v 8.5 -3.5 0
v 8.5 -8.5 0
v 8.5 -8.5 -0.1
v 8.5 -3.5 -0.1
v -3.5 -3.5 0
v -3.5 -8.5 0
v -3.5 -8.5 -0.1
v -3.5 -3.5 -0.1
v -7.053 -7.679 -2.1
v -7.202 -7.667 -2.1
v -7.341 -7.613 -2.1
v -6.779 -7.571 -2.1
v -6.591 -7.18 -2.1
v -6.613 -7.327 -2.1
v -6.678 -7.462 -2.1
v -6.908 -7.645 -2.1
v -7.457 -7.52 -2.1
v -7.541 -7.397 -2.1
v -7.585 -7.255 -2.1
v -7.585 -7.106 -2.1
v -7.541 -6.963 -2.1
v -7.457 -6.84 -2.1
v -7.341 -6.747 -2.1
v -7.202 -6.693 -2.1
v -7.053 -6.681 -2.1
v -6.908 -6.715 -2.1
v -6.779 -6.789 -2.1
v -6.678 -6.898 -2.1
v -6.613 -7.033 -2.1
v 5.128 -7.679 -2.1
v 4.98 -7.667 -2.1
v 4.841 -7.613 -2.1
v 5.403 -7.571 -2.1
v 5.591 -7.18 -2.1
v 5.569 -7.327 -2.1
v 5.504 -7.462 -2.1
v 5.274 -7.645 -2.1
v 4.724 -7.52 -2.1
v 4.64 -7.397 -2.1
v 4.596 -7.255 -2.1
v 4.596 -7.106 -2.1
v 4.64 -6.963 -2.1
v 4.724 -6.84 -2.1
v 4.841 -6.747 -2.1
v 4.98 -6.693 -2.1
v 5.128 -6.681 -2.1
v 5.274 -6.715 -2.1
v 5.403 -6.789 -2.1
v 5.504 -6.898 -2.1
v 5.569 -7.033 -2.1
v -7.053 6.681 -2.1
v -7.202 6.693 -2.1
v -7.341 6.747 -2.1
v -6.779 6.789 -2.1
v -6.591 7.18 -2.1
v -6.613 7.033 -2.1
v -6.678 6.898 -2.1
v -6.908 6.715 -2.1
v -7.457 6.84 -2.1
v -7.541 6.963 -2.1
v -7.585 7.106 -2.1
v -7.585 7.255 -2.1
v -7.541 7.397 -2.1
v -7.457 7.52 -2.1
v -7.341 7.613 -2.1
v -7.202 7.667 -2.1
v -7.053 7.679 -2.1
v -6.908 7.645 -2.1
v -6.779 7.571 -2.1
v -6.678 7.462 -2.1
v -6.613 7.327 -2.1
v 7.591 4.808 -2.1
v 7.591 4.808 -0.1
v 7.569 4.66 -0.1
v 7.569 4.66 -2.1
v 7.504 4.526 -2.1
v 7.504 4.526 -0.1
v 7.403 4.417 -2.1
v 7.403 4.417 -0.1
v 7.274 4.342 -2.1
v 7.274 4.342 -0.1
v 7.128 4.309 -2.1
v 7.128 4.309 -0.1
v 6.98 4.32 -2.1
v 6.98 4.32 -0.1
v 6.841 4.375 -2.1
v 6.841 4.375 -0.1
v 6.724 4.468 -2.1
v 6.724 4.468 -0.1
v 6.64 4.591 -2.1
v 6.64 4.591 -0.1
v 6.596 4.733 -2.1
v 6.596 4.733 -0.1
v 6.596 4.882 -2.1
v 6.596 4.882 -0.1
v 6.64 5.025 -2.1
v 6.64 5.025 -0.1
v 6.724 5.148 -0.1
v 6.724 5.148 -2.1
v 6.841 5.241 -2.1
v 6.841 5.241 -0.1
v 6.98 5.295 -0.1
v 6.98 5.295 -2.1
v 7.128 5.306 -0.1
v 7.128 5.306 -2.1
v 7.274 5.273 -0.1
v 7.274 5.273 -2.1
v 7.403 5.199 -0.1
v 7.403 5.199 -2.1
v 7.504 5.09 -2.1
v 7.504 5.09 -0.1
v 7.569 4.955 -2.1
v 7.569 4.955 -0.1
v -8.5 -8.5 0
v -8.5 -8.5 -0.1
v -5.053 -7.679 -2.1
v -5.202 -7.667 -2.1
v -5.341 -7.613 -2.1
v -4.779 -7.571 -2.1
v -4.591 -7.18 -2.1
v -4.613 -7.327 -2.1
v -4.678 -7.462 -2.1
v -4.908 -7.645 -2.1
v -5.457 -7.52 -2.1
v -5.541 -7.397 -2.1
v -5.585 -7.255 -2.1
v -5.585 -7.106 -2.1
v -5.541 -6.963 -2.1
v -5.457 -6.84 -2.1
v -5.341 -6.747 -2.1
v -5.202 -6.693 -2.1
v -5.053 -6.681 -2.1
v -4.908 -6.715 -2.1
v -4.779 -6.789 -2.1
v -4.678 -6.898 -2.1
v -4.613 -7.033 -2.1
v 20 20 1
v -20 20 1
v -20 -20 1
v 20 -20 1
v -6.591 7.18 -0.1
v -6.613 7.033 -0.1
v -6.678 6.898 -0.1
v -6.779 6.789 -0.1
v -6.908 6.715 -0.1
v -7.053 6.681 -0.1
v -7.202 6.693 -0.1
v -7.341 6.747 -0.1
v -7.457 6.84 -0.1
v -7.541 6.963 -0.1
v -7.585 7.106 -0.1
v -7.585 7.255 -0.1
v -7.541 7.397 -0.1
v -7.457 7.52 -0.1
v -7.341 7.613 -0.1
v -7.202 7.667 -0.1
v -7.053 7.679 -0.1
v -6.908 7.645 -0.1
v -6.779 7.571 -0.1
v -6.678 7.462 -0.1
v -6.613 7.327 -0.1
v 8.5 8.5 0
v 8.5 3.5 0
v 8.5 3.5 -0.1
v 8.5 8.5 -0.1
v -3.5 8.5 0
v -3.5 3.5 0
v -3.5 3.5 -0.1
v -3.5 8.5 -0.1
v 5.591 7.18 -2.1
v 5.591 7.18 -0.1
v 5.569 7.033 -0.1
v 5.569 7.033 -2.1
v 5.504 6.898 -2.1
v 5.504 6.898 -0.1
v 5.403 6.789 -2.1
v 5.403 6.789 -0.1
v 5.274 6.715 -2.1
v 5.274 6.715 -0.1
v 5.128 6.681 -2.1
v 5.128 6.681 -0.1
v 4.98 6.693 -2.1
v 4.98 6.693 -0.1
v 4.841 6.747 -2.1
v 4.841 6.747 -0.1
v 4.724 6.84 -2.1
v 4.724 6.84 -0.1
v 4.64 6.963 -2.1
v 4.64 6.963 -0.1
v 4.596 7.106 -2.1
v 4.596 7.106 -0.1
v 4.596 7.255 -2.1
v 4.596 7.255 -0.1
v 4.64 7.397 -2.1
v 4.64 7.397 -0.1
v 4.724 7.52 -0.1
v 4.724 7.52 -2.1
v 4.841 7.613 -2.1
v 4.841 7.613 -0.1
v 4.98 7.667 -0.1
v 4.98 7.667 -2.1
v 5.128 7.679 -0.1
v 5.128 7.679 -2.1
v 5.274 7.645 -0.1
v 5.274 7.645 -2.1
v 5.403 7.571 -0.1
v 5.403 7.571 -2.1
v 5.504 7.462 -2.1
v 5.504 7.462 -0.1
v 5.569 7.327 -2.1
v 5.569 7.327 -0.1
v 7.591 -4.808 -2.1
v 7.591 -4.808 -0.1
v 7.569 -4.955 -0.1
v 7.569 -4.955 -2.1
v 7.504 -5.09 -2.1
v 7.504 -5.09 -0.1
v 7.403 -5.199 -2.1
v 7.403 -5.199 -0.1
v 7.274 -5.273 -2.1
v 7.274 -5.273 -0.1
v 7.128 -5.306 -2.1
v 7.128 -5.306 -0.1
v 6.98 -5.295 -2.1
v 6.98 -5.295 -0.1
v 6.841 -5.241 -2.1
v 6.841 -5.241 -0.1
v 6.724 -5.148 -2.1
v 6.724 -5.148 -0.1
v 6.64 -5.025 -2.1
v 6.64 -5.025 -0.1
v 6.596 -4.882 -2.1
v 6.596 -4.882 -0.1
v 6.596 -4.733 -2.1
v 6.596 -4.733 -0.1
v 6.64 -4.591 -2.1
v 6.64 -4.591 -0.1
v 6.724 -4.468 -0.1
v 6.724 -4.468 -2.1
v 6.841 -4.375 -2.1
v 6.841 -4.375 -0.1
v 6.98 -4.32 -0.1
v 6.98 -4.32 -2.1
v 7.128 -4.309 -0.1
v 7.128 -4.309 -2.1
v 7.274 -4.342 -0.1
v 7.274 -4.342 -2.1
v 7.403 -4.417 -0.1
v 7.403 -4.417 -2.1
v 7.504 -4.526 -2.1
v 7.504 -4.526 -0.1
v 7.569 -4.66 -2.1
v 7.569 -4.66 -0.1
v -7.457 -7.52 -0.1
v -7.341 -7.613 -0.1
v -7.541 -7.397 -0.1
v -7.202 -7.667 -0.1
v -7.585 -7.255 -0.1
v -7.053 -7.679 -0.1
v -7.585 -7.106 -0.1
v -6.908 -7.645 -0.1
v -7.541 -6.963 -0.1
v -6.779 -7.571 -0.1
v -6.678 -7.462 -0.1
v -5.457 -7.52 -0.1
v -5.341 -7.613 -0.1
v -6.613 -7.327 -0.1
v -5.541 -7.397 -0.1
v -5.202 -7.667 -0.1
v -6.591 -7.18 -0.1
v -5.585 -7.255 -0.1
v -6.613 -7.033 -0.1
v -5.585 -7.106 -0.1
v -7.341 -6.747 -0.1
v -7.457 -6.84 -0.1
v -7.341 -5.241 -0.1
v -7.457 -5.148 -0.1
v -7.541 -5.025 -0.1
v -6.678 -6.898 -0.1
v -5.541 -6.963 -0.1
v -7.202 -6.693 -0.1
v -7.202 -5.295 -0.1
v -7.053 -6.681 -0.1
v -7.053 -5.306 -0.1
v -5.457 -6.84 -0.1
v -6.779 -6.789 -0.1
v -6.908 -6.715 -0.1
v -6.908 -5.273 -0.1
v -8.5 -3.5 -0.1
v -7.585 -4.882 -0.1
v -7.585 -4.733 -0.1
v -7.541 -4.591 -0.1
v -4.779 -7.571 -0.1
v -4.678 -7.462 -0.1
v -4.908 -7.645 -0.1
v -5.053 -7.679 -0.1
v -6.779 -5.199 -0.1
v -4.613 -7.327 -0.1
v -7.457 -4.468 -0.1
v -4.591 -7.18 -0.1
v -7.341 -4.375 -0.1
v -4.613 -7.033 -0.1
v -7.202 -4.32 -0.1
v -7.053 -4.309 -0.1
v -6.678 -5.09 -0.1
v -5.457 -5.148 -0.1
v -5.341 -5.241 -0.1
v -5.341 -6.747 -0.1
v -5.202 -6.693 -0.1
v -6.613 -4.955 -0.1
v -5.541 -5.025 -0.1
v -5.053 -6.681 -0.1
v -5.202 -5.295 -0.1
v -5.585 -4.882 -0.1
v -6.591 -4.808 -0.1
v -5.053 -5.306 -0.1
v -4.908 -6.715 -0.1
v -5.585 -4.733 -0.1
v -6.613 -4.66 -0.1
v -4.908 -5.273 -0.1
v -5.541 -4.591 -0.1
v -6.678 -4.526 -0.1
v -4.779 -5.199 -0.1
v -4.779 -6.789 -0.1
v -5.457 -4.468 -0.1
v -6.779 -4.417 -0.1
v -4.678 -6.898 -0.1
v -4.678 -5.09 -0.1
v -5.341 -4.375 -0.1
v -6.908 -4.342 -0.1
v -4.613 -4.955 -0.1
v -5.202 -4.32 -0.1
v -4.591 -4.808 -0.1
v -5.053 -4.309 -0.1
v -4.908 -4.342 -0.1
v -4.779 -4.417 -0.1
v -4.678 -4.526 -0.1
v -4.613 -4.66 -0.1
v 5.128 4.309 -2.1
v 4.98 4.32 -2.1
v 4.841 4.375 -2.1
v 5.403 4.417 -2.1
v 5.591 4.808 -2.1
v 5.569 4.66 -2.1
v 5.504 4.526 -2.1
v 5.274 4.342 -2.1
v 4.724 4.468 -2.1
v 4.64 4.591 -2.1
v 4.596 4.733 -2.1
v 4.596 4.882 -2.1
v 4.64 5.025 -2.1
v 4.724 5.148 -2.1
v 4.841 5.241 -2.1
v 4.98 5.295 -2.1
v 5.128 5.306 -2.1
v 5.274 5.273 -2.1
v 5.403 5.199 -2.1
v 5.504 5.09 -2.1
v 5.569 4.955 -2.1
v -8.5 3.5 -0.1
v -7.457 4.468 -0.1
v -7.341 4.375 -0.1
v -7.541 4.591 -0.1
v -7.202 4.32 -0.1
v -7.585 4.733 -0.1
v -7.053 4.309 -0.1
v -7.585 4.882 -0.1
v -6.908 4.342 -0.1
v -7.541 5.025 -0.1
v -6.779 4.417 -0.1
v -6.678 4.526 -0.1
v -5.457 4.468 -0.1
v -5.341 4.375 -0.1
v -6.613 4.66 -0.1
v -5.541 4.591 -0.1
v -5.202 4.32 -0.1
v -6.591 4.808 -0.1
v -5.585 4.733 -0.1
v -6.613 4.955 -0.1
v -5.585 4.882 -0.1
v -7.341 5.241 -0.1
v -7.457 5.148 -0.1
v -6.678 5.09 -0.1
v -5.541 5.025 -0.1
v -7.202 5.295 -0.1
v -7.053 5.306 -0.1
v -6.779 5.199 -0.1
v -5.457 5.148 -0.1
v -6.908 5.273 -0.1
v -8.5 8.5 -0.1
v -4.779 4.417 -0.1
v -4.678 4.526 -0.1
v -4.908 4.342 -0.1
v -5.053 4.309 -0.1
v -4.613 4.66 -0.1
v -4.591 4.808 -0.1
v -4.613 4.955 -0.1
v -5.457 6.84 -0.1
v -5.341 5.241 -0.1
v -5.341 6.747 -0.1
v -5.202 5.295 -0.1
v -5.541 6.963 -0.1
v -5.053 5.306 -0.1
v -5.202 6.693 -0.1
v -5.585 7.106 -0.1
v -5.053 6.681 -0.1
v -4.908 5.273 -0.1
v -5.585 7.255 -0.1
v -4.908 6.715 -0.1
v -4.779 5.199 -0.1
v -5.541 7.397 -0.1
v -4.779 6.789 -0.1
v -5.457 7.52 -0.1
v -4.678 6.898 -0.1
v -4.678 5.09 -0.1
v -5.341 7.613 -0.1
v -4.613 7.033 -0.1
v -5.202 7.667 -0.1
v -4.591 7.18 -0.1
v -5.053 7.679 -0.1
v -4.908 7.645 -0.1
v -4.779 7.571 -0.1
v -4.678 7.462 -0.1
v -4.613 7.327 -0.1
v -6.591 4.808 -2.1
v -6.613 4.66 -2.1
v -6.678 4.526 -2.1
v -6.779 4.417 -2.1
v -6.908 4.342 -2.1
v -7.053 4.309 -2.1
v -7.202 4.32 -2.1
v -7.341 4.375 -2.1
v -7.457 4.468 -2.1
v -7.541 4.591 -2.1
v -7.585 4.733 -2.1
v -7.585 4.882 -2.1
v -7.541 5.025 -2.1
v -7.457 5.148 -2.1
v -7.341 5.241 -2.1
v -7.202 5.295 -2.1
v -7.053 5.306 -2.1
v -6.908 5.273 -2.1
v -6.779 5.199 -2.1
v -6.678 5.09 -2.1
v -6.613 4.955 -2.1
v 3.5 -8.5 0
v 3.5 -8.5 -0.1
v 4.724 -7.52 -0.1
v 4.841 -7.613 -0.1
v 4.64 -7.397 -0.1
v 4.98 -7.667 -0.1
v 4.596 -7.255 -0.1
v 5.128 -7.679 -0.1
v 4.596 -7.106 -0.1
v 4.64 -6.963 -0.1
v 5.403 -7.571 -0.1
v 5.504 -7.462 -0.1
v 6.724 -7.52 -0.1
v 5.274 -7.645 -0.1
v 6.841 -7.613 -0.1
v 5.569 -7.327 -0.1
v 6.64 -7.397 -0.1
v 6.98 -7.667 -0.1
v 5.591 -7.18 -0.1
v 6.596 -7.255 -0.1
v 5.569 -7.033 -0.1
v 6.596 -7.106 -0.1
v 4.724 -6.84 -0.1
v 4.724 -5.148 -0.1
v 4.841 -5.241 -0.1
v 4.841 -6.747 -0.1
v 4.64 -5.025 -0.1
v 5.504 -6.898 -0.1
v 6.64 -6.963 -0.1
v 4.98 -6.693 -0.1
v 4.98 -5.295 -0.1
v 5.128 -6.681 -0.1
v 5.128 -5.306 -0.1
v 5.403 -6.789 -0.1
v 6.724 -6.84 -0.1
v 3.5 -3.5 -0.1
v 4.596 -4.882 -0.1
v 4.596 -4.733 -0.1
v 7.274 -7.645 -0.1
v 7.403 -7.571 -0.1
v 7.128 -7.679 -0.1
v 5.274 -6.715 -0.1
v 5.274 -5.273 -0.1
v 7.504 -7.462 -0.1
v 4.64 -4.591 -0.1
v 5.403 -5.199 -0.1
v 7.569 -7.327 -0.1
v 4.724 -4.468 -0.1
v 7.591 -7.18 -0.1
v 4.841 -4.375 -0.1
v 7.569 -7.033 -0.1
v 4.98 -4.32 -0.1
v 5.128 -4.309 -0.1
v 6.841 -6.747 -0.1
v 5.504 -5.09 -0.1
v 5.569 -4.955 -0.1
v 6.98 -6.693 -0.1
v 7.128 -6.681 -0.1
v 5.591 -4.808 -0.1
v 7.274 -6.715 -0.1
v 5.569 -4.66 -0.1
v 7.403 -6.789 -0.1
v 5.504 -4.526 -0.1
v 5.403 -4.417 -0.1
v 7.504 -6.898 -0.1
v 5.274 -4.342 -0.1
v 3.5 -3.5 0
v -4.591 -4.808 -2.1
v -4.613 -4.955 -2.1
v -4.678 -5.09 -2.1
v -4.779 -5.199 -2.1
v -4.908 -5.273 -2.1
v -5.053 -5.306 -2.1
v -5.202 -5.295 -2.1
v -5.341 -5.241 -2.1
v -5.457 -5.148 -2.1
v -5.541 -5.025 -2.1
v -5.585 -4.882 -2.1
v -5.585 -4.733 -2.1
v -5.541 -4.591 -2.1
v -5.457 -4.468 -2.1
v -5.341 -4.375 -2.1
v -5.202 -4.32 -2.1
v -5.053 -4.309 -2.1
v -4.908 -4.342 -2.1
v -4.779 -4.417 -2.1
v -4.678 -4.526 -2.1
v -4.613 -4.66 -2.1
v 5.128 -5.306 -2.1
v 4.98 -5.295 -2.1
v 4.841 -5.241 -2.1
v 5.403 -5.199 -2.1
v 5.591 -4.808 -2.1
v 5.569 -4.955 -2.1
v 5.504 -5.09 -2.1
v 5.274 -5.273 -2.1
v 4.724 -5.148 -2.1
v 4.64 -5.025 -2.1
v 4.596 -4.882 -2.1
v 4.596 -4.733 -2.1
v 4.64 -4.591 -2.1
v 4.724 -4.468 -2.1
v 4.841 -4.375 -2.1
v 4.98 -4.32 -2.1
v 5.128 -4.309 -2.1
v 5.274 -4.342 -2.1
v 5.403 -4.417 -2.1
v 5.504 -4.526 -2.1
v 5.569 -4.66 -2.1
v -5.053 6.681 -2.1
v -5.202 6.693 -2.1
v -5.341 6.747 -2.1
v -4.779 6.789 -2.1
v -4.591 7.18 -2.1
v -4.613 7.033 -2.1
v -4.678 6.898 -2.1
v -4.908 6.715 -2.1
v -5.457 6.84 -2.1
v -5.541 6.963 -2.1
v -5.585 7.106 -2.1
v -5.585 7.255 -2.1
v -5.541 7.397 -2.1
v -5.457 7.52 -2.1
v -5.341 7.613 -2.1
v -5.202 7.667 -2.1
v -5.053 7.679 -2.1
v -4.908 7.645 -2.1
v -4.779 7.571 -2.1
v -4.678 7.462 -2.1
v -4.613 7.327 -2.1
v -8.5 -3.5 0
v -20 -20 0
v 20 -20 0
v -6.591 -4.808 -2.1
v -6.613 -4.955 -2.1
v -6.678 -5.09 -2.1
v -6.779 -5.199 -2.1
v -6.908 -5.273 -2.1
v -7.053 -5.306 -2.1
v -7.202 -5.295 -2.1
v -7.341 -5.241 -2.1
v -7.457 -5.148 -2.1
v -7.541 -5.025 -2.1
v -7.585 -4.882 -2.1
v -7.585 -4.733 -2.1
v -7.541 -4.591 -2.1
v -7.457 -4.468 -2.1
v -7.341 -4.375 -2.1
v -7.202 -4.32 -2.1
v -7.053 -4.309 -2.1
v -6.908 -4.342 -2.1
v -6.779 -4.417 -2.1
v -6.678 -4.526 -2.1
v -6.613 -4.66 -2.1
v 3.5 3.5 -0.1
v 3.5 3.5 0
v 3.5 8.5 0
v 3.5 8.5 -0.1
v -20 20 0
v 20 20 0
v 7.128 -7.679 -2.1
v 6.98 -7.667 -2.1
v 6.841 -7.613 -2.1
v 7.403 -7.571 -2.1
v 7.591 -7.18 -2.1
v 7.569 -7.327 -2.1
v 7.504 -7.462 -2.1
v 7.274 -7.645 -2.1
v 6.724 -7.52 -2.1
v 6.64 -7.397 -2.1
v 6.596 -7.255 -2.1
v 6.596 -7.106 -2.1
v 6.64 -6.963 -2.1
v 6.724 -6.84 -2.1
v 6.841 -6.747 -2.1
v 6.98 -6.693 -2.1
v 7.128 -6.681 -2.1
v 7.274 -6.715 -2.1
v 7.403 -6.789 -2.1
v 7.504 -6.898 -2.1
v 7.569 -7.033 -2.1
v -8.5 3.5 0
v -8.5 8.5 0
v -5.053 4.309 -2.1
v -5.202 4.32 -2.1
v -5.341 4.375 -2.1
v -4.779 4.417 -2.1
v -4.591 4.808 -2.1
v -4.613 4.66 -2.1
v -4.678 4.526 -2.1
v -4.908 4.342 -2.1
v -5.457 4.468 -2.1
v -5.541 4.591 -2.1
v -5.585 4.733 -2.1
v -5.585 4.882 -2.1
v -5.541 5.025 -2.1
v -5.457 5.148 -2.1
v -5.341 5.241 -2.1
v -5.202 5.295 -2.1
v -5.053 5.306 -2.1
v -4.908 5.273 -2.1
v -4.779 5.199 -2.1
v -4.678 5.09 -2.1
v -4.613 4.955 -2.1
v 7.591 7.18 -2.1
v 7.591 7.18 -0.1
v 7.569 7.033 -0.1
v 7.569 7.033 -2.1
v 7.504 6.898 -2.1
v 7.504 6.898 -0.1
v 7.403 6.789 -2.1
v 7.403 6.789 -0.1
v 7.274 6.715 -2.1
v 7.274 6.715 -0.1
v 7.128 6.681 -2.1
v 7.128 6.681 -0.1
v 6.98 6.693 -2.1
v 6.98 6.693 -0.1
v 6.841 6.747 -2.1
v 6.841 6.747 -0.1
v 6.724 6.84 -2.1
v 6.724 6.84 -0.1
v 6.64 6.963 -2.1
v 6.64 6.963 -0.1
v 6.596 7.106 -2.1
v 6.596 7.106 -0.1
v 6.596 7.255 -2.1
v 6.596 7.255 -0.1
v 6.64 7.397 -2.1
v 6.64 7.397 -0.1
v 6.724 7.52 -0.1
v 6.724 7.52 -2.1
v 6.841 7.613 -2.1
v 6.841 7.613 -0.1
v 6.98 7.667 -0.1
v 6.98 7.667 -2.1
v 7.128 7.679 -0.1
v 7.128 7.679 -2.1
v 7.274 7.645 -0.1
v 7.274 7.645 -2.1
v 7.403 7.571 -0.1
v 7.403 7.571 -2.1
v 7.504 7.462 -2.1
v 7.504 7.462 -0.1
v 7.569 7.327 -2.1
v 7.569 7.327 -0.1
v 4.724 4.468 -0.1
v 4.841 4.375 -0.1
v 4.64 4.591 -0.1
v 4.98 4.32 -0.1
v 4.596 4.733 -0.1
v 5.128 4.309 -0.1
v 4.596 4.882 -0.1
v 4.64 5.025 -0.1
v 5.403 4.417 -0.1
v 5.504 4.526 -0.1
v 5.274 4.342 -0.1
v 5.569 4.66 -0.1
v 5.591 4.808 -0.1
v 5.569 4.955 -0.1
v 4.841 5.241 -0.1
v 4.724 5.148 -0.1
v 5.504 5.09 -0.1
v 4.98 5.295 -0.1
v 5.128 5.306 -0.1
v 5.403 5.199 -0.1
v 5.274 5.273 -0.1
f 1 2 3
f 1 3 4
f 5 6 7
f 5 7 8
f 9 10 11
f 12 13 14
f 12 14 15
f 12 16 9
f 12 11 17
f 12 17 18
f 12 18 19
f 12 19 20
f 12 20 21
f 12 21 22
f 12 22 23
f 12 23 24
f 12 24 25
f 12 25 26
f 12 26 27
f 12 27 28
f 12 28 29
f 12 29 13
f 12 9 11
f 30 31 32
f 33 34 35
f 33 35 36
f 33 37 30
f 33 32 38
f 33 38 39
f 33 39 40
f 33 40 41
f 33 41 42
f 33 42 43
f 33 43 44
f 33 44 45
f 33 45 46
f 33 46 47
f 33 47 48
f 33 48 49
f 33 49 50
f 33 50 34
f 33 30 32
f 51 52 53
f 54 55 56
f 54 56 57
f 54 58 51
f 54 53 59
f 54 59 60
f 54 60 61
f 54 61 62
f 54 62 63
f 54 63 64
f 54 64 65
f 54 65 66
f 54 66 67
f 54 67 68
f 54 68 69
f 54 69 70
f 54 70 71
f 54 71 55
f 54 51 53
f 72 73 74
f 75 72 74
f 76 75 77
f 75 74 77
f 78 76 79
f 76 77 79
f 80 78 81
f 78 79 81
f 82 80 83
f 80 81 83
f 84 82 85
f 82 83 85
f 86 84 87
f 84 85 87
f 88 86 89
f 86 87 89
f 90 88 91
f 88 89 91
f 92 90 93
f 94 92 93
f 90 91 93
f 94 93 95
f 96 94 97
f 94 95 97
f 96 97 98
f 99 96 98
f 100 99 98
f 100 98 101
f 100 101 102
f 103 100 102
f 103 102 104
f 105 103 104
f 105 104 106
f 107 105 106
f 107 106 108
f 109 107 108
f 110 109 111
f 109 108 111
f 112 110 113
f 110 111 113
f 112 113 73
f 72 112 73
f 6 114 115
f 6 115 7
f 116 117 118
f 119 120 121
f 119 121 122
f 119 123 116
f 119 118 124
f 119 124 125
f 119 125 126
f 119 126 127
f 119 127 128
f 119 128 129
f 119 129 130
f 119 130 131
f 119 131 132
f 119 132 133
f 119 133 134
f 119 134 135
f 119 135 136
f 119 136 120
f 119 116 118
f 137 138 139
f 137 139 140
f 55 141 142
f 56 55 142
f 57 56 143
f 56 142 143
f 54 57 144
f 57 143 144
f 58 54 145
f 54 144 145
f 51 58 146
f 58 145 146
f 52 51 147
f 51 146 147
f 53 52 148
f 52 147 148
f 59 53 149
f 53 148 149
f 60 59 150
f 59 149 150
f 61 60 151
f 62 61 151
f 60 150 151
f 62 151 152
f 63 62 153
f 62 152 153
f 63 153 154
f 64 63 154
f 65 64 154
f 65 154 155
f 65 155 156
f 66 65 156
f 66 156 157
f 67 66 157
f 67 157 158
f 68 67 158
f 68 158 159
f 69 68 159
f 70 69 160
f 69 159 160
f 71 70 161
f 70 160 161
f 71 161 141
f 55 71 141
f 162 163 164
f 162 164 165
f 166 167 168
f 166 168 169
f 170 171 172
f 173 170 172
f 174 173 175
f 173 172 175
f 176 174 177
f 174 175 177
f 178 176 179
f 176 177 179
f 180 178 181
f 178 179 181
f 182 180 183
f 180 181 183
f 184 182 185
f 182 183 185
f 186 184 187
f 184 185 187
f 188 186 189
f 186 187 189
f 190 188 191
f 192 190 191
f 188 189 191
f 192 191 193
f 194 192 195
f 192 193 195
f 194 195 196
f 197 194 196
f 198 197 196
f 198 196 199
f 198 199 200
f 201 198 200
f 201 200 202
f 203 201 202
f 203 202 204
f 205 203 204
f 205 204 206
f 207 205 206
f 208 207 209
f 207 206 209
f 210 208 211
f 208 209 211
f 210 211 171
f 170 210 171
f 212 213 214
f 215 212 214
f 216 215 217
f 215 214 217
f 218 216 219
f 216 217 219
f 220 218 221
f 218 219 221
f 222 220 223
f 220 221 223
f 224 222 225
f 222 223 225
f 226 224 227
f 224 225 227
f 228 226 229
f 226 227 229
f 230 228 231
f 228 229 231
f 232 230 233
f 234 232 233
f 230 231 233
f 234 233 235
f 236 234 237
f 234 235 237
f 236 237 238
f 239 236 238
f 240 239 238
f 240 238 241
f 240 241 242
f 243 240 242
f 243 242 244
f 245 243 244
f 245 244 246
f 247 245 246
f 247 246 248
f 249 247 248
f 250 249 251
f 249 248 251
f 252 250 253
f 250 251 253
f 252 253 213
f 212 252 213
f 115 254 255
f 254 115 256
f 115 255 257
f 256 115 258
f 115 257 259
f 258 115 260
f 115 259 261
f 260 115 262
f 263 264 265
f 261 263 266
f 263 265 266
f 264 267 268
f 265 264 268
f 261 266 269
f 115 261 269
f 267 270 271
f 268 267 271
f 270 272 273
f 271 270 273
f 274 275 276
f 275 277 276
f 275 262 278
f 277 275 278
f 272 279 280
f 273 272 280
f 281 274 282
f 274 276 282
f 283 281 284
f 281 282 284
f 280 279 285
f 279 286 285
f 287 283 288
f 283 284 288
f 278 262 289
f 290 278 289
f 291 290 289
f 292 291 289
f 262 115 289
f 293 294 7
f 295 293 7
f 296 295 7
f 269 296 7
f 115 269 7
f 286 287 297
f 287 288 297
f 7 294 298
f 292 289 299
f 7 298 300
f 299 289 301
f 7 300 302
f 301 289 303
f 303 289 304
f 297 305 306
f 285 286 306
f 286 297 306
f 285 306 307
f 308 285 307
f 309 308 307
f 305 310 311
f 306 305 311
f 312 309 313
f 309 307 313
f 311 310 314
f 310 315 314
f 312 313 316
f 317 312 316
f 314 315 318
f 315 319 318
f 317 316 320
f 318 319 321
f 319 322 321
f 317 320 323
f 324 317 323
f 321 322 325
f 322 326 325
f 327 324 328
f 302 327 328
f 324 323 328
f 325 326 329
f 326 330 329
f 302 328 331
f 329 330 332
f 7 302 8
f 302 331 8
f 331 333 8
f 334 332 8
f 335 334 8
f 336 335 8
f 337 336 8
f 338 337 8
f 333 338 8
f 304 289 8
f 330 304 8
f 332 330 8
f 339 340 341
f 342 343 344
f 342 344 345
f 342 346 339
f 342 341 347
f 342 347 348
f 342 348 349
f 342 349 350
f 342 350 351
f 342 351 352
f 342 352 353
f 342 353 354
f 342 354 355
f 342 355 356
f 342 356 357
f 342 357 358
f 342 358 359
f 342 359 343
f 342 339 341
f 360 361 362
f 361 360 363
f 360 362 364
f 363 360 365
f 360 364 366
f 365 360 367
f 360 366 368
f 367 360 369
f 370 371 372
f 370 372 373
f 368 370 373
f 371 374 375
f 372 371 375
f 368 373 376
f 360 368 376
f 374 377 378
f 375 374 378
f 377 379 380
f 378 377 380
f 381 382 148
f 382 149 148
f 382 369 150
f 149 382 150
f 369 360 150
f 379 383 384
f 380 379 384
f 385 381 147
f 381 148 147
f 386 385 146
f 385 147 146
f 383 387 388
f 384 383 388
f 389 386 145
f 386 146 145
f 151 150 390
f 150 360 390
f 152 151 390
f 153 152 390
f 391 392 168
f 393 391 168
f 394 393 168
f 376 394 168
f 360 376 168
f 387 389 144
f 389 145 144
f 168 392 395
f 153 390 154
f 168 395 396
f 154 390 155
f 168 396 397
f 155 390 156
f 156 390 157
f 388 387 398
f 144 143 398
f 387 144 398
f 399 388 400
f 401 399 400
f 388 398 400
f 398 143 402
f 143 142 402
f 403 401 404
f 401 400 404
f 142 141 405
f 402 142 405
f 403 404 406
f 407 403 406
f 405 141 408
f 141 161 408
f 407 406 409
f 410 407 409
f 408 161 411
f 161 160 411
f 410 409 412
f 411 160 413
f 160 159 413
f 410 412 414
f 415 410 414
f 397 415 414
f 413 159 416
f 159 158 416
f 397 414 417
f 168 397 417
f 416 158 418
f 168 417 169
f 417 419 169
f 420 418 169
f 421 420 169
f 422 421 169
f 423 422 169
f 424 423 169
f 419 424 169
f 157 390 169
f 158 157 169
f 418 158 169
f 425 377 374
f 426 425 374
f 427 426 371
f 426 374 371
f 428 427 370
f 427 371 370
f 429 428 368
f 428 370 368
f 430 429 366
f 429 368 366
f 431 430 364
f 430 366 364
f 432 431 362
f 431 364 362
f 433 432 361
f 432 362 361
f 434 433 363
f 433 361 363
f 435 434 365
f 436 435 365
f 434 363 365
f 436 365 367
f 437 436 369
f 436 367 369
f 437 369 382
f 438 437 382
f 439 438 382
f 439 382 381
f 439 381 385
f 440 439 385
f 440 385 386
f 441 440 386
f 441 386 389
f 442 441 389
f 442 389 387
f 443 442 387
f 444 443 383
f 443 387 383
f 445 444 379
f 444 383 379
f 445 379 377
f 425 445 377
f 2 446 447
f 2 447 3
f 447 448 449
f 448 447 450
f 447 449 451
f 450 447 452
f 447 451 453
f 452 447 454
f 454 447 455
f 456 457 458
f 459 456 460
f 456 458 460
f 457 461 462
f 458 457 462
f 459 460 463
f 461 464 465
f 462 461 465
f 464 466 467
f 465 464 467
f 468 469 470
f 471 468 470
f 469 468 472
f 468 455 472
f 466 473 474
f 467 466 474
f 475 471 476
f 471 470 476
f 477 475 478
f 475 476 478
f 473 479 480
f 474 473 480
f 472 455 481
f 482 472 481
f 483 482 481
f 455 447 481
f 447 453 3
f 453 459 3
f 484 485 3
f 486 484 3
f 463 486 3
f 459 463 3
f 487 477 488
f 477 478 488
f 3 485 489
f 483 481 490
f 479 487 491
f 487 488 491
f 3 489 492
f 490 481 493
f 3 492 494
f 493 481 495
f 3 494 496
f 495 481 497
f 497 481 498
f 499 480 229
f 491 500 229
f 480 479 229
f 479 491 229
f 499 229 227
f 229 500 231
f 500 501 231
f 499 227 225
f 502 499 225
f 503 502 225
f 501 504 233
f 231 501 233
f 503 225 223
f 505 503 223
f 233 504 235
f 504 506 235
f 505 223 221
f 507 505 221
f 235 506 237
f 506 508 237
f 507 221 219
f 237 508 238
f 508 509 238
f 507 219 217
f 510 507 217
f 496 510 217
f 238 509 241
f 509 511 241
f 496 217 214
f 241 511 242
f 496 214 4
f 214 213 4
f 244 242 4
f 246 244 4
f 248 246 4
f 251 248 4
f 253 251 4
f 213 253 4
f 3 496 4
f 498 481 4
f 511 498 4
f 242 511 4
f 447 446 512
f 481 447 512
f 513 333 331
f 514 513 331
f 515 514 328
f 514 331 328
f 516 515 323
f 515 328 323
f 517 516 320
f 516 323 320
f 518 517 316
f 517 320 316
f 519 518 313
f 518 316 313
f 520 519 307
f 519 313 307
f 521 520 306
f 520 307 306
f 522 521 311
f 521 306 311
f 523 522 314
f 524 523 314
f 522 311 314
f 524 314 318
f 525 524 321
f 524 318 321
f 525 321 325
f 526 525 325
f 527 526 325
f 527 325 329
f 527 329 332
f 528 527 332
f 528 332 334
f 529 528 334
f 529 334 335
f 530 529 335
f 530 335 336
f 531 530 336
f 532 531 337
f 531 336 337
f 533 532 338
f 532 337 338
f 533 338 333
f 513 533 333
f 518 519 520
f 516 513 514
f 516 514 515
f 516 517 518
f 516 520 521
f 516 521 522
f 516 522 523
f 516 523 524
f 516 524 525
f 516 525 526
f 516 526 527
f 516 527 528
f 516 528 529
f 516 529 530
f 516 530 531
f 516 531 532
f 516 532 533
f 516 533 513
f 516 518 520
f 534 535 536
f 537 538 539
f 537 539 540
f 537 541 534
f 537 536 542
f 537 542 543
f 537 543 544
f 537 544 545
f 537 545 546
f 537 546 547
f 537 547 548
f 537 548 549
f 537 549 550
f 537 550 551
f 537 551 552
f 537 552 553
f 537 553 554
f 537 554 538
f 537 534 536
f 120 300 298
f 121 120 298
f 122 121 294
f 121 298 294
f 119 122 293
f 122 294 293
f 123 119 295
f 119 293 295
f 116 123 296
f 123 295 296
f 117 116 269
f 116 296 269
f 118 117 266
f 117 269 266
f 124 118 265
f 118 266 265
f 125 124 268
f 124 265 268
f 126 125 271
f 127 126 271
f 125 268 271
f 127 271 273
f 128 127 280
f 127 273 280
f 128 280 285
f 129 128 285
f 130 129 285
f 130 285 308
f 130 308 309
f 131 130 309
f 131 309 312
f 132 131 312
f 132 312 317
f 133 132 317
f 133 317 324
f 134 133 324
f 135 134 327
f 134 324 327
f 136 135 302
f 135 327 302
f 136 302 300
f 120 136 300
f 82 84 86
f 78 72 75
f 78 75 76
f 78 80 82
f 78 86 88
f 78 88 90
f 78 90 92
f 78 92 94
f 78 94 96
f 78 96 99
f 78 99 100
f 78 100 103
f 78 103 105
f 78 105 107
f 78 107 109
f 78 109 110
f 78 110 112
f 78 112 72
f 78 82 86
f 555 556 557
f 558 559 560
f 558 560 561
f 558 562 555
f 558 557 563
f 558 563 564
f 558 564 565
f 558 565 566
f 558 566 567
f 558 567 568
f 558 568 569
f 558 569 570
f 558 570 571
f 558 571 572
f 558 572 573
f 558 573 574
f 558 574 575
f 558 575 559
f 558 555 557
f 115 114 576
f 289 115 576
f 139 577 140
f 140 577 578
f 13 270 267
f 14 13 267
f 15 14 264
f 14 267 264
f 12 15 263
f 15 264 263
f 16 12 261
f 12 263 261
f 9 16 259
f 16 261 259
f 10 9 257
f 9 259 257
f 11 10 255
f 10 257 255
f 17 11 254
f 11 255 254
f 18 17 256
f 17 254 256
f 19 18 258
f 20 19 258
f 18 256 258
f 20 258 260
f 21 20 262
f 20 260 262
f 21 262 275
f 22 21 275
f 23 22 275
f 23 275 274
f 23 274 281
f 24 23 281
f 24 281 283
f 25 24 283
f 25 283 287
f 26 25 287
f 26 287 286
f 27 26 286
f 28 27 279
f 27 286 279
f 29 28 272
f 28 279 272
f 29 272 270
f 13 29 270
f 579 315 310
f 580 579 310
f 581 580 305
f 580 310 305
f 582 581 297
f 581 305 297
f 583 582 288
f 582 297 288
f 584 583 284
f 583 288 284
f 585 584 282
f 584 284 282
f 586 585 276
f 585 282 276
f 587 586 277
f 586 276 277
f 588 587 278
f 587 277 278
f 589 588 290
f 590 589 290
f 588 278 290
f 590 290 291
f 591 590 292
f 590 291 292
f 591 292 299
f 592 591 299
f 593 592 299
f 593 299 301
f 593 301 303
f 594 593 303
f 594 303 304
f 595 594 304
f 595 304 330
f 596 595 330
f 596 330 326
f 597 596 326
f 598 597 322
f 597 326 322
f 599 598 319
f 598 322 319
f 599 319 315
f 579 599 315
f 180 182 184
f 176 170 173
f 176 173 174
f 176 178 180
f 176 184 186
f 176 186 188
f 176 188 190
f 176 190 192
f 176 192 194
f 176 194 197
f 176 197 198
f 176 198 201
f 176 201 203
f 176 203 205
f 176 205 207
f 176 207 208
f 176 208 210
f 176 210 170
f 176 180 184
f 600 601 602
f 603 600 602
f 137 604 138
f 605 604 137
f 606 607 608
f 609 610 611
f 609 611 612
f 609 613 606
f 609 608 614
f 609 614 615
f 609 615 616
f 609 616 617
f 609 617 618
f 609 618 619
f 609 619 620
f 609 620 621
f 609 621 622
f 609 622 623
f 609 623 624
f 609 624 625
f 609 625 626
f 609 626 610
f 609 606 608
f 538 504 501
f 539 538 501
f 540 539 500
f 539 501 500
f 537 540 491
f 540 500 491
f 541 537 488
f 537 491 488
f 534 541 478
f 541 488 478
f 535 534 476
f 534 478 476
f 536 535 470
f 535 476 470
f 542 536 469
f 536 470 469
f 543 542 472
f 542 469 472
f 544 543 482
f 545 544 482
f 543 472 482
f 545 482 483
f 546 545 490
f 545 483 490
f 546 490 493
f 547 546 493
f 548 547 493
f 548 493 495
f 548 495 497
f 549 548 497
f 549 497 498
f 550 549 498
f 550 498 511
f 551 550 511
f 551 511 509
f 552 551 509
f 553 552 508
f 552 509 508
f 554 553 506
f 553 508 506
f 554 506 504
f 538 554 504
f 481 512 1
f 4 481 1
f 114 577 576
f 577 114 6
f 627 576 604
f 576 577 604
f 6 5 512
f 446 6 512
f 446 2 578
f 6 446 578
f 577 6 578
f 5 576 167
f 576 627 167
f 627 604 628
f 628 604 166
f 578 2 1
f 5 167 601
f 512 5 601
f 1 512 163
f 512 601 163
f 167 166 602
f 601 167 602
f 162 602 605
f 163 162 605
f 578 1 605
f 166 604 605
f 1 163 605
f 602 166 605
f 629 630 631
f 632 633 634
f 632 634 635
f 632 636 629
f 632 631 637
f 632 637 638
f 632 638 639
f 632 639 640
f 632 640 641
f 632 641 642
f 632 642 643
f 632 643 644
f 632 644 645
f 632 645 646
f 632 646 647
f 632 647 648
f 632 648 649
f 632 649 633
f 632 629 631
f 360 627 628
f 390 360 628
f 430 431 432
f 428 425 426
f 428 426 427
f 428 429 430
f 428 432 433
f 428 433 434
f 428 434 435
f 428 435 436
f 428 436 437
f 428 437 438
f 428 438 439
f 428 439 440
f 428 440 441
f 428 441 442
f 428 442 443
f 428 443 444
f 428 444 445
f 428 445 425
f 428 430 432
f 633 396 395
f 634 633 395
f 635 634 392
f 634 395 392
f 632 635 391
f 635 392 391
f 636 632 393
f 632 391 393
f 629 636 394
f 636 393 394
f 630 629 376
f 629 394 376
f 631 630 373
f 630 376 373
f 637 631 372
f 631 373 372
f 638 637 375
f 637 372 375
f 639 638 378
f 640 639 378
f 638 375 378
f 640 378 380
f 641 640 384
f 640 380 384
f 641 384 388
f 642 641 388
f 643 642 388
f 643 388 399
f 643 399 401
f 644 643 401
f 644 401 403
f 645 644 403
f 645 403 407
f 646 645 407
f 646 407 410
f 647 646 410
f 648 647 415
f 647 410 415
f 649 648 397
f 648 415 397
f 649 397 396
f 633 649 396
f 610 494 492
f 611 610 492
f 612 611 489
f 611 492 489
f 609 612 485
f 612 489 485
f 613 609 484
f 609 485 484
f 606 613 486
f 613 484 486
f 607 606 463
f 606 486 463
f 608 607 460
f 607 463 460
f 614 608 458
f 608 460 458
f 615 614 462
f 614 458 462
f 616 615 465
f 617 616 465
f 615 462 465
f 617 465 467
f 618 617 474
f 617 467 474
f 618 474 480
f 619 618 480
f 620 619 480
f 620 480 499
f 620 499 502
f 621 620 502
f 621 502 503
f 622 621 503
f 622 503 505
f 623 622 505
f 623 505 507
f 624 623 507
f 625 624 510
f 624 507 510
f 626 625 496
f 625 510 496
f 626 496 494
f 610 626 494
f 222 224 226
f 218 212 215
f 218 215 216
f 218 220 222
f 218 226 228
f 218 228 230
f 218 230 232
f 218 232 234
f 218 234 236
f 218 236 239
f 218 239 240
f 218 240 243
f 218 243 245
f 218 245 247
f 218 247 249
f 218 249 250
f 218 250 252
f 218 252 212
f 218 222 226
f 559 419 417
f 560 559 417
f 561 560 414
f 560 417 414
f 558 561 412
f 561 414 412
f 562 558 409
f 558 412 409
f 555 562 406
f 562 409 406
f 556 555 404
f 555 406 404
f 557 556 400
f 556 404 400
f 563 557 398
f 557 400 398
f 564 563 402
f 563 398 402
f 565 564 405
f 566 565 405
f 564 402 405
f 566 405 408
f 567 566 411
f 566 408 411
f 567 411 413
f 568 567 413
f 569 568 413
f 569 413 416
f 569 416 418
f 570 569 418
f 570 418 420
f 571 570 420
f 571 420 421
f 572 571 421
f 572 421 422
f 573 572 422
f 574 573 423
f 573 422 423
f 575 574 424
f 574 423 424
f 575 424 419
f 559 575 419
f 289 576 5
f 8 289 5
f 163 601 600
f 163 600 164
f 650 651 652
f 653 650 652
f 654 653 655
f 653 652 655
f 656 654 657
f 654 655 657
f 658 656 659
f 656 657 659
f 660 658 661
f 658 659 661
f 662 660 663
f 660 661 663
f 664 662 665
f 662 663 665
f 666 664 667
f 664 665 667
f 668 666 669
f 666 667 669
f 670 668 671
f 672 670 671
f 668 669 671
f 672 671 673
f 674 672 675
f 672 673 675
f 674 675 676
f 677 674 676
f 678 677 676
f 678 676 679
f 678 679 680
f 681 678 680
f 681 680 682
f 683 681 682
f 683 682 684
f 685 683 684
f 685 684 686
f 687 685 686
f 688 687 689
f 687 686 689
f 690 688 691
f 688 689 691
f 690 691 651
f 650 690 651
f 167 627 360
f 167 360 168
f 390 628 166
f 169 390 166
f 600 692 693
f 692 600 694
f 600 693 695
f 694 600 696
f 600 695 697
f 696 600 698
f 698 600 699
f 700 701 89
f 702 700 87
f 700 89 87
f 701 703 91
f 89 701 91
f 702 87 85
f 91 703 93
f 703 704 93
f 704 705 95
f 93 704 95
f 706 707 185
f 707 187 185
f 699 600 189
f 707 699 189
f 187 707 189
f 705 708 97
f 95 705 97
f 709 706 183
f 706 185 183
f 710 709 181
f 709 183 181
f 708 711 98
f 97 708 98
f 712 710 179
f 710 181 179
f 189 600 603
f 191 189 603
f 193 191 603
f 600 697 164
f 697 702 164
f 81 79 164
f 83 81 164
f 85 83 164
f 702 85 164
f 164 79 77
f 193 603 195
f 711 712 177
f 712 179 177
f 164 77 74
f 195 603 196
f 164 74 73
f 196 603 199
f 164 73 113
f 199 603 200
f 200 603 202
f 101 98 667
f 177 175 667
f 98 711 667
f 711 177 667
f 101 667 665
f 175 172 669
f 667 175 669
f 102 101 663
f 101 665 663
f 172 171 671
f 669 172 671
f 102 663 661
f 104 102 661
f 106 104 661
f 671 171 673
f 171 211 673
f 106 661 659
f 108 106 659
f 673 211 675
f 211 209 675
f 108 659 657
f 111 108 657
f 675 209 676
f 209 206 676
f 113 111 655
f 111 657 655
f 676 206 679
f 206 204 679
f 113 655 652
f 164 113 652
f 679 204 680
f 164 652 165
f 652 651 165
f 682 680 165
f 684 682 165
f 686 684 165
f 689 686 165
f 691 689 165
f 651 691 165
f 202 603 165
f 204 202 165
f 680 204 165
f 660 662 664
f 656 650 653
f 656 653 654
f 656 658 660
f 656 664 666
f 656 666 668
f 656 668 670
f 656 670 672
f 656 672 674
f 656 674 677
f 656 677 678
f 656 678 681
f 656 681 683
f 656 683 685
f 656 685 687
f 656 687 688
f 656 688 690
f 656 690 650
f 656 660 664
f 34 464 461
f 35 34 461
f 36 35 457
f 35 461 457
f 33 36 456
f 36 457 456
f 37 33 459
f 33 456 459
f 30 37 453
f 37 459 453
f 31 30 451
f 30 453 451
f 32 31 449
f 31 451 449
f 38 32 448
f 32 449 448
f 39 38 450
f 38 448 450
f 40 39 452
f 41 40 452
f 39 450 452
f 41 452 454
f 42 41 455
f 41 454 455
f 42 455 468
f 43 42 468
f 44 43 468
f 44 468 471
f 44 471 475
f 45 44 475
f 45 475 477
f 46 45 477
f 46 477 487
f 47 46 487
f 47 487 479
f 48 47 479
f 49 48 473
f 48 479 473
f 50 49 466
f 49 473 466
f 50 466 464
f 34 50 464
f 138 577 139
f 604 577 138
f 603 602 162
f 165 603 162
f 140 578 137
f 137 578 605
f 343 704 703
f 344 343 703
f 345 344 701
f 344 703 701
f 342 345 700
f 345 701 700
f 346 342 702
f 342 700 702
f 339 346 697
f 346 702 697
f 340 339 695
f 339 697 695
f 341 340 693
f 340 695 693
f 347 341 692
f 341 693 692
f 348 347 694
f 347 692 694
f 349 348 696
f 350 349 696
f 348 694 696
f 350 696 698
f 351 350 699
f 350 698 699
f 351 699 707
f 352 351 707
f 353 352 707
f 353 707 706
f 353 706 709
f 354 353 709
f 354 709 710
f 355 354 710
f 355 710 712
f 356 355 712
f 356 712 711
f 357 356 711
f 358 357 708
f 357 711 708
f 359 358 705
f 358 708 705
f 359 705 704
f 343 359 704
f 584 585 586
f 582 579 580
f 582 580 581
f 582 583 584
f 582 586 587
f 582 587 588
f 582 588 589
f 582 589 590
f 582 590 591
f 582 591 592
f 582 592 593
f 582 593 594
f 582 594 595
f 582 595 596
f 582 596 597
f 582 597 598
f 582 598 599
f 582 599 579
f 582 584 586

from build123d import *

# Parameters (mm, degrees)
F0_W     = 5
F0_H     = 5
F1_DEPTH = 0.1
F2_W     = 40
F2_H     = 40
F3_DEPTH = 1
F4_R     = 0.5
F5_DEPTH = 2


with BuildPart() as f1:
    # F0 (on Top) → F1 (new body)
    with BuildSketch(Plane.XY):
        with Locations((-6, 6)):
            Rectangle(F0_W, F0_H)
        with Locations((6, 6)):
            Rectangle(F0_W, F0_H)
        with Locations((6, -6)):
            Rectangle(F0_W, F0_H)
        with Locations((-6, -6)):
            Rectangle(F0_W, F0_H)
    extrude(amount=-F1_DEPTH)

    # F2 (on Top) → F3 (join)
    with BuildSketch(Plane.XY):
        Rectangle(F2_W, F2_H)
    extrude(amount=F3_DEPTH)

    # F4 (on face) → F5 (join)
    with BuildSketch(Plane(origin=(0, 0, -0.1), x_dir=(1, 0, 0), z_dir=(0, 0, -1))):
        with Locations((-7.090843, 7.180036)):
            Circle(F4_R)
        with Locations((-5.090843, 7.180036)):
            Circle(F4_R)
        with Locations((-7.090843, 4.807855)):
            Circle(F4_R)
        with Locations((-5.090843, 4.807855)):
            Circle(F4_R)
        with Locations((7.090843, 7.180036)):
            Circle(F4_R)
        with Locations((5.090843, 7.180036)):
            Circle(F4_R)
        with Locations((5.090843, 4.807855)):
            Circle(F4_R)
        with Locations((7.090843, 4.807855)):
            Circle(F4_R)
        with Locations((-7.090843, -4.807855)):
            Circle(F4_R)
        with Locations((-5.090843, -7.180036)):
            Circle(F4_R)
        with Locations((-7.090843, -7.180036)):
            Circle(F4_R)
        with Locations((-5.090843, -4.807855)):
            Circle(F4_R)
        with Locations((5.090843, -7.180036)):
            Circle(F4_R)
        with Locations((5.090843, -4.807855)):
            Circle(F4_R)
        with Locations((7.090843, -4.807855)):
            Circle(F4_R)
        with Locations((7.090843, -7.180036)):
            Circle(F4_R)
    extrude(amount=F5_DEPTH)


solid = f1.part
